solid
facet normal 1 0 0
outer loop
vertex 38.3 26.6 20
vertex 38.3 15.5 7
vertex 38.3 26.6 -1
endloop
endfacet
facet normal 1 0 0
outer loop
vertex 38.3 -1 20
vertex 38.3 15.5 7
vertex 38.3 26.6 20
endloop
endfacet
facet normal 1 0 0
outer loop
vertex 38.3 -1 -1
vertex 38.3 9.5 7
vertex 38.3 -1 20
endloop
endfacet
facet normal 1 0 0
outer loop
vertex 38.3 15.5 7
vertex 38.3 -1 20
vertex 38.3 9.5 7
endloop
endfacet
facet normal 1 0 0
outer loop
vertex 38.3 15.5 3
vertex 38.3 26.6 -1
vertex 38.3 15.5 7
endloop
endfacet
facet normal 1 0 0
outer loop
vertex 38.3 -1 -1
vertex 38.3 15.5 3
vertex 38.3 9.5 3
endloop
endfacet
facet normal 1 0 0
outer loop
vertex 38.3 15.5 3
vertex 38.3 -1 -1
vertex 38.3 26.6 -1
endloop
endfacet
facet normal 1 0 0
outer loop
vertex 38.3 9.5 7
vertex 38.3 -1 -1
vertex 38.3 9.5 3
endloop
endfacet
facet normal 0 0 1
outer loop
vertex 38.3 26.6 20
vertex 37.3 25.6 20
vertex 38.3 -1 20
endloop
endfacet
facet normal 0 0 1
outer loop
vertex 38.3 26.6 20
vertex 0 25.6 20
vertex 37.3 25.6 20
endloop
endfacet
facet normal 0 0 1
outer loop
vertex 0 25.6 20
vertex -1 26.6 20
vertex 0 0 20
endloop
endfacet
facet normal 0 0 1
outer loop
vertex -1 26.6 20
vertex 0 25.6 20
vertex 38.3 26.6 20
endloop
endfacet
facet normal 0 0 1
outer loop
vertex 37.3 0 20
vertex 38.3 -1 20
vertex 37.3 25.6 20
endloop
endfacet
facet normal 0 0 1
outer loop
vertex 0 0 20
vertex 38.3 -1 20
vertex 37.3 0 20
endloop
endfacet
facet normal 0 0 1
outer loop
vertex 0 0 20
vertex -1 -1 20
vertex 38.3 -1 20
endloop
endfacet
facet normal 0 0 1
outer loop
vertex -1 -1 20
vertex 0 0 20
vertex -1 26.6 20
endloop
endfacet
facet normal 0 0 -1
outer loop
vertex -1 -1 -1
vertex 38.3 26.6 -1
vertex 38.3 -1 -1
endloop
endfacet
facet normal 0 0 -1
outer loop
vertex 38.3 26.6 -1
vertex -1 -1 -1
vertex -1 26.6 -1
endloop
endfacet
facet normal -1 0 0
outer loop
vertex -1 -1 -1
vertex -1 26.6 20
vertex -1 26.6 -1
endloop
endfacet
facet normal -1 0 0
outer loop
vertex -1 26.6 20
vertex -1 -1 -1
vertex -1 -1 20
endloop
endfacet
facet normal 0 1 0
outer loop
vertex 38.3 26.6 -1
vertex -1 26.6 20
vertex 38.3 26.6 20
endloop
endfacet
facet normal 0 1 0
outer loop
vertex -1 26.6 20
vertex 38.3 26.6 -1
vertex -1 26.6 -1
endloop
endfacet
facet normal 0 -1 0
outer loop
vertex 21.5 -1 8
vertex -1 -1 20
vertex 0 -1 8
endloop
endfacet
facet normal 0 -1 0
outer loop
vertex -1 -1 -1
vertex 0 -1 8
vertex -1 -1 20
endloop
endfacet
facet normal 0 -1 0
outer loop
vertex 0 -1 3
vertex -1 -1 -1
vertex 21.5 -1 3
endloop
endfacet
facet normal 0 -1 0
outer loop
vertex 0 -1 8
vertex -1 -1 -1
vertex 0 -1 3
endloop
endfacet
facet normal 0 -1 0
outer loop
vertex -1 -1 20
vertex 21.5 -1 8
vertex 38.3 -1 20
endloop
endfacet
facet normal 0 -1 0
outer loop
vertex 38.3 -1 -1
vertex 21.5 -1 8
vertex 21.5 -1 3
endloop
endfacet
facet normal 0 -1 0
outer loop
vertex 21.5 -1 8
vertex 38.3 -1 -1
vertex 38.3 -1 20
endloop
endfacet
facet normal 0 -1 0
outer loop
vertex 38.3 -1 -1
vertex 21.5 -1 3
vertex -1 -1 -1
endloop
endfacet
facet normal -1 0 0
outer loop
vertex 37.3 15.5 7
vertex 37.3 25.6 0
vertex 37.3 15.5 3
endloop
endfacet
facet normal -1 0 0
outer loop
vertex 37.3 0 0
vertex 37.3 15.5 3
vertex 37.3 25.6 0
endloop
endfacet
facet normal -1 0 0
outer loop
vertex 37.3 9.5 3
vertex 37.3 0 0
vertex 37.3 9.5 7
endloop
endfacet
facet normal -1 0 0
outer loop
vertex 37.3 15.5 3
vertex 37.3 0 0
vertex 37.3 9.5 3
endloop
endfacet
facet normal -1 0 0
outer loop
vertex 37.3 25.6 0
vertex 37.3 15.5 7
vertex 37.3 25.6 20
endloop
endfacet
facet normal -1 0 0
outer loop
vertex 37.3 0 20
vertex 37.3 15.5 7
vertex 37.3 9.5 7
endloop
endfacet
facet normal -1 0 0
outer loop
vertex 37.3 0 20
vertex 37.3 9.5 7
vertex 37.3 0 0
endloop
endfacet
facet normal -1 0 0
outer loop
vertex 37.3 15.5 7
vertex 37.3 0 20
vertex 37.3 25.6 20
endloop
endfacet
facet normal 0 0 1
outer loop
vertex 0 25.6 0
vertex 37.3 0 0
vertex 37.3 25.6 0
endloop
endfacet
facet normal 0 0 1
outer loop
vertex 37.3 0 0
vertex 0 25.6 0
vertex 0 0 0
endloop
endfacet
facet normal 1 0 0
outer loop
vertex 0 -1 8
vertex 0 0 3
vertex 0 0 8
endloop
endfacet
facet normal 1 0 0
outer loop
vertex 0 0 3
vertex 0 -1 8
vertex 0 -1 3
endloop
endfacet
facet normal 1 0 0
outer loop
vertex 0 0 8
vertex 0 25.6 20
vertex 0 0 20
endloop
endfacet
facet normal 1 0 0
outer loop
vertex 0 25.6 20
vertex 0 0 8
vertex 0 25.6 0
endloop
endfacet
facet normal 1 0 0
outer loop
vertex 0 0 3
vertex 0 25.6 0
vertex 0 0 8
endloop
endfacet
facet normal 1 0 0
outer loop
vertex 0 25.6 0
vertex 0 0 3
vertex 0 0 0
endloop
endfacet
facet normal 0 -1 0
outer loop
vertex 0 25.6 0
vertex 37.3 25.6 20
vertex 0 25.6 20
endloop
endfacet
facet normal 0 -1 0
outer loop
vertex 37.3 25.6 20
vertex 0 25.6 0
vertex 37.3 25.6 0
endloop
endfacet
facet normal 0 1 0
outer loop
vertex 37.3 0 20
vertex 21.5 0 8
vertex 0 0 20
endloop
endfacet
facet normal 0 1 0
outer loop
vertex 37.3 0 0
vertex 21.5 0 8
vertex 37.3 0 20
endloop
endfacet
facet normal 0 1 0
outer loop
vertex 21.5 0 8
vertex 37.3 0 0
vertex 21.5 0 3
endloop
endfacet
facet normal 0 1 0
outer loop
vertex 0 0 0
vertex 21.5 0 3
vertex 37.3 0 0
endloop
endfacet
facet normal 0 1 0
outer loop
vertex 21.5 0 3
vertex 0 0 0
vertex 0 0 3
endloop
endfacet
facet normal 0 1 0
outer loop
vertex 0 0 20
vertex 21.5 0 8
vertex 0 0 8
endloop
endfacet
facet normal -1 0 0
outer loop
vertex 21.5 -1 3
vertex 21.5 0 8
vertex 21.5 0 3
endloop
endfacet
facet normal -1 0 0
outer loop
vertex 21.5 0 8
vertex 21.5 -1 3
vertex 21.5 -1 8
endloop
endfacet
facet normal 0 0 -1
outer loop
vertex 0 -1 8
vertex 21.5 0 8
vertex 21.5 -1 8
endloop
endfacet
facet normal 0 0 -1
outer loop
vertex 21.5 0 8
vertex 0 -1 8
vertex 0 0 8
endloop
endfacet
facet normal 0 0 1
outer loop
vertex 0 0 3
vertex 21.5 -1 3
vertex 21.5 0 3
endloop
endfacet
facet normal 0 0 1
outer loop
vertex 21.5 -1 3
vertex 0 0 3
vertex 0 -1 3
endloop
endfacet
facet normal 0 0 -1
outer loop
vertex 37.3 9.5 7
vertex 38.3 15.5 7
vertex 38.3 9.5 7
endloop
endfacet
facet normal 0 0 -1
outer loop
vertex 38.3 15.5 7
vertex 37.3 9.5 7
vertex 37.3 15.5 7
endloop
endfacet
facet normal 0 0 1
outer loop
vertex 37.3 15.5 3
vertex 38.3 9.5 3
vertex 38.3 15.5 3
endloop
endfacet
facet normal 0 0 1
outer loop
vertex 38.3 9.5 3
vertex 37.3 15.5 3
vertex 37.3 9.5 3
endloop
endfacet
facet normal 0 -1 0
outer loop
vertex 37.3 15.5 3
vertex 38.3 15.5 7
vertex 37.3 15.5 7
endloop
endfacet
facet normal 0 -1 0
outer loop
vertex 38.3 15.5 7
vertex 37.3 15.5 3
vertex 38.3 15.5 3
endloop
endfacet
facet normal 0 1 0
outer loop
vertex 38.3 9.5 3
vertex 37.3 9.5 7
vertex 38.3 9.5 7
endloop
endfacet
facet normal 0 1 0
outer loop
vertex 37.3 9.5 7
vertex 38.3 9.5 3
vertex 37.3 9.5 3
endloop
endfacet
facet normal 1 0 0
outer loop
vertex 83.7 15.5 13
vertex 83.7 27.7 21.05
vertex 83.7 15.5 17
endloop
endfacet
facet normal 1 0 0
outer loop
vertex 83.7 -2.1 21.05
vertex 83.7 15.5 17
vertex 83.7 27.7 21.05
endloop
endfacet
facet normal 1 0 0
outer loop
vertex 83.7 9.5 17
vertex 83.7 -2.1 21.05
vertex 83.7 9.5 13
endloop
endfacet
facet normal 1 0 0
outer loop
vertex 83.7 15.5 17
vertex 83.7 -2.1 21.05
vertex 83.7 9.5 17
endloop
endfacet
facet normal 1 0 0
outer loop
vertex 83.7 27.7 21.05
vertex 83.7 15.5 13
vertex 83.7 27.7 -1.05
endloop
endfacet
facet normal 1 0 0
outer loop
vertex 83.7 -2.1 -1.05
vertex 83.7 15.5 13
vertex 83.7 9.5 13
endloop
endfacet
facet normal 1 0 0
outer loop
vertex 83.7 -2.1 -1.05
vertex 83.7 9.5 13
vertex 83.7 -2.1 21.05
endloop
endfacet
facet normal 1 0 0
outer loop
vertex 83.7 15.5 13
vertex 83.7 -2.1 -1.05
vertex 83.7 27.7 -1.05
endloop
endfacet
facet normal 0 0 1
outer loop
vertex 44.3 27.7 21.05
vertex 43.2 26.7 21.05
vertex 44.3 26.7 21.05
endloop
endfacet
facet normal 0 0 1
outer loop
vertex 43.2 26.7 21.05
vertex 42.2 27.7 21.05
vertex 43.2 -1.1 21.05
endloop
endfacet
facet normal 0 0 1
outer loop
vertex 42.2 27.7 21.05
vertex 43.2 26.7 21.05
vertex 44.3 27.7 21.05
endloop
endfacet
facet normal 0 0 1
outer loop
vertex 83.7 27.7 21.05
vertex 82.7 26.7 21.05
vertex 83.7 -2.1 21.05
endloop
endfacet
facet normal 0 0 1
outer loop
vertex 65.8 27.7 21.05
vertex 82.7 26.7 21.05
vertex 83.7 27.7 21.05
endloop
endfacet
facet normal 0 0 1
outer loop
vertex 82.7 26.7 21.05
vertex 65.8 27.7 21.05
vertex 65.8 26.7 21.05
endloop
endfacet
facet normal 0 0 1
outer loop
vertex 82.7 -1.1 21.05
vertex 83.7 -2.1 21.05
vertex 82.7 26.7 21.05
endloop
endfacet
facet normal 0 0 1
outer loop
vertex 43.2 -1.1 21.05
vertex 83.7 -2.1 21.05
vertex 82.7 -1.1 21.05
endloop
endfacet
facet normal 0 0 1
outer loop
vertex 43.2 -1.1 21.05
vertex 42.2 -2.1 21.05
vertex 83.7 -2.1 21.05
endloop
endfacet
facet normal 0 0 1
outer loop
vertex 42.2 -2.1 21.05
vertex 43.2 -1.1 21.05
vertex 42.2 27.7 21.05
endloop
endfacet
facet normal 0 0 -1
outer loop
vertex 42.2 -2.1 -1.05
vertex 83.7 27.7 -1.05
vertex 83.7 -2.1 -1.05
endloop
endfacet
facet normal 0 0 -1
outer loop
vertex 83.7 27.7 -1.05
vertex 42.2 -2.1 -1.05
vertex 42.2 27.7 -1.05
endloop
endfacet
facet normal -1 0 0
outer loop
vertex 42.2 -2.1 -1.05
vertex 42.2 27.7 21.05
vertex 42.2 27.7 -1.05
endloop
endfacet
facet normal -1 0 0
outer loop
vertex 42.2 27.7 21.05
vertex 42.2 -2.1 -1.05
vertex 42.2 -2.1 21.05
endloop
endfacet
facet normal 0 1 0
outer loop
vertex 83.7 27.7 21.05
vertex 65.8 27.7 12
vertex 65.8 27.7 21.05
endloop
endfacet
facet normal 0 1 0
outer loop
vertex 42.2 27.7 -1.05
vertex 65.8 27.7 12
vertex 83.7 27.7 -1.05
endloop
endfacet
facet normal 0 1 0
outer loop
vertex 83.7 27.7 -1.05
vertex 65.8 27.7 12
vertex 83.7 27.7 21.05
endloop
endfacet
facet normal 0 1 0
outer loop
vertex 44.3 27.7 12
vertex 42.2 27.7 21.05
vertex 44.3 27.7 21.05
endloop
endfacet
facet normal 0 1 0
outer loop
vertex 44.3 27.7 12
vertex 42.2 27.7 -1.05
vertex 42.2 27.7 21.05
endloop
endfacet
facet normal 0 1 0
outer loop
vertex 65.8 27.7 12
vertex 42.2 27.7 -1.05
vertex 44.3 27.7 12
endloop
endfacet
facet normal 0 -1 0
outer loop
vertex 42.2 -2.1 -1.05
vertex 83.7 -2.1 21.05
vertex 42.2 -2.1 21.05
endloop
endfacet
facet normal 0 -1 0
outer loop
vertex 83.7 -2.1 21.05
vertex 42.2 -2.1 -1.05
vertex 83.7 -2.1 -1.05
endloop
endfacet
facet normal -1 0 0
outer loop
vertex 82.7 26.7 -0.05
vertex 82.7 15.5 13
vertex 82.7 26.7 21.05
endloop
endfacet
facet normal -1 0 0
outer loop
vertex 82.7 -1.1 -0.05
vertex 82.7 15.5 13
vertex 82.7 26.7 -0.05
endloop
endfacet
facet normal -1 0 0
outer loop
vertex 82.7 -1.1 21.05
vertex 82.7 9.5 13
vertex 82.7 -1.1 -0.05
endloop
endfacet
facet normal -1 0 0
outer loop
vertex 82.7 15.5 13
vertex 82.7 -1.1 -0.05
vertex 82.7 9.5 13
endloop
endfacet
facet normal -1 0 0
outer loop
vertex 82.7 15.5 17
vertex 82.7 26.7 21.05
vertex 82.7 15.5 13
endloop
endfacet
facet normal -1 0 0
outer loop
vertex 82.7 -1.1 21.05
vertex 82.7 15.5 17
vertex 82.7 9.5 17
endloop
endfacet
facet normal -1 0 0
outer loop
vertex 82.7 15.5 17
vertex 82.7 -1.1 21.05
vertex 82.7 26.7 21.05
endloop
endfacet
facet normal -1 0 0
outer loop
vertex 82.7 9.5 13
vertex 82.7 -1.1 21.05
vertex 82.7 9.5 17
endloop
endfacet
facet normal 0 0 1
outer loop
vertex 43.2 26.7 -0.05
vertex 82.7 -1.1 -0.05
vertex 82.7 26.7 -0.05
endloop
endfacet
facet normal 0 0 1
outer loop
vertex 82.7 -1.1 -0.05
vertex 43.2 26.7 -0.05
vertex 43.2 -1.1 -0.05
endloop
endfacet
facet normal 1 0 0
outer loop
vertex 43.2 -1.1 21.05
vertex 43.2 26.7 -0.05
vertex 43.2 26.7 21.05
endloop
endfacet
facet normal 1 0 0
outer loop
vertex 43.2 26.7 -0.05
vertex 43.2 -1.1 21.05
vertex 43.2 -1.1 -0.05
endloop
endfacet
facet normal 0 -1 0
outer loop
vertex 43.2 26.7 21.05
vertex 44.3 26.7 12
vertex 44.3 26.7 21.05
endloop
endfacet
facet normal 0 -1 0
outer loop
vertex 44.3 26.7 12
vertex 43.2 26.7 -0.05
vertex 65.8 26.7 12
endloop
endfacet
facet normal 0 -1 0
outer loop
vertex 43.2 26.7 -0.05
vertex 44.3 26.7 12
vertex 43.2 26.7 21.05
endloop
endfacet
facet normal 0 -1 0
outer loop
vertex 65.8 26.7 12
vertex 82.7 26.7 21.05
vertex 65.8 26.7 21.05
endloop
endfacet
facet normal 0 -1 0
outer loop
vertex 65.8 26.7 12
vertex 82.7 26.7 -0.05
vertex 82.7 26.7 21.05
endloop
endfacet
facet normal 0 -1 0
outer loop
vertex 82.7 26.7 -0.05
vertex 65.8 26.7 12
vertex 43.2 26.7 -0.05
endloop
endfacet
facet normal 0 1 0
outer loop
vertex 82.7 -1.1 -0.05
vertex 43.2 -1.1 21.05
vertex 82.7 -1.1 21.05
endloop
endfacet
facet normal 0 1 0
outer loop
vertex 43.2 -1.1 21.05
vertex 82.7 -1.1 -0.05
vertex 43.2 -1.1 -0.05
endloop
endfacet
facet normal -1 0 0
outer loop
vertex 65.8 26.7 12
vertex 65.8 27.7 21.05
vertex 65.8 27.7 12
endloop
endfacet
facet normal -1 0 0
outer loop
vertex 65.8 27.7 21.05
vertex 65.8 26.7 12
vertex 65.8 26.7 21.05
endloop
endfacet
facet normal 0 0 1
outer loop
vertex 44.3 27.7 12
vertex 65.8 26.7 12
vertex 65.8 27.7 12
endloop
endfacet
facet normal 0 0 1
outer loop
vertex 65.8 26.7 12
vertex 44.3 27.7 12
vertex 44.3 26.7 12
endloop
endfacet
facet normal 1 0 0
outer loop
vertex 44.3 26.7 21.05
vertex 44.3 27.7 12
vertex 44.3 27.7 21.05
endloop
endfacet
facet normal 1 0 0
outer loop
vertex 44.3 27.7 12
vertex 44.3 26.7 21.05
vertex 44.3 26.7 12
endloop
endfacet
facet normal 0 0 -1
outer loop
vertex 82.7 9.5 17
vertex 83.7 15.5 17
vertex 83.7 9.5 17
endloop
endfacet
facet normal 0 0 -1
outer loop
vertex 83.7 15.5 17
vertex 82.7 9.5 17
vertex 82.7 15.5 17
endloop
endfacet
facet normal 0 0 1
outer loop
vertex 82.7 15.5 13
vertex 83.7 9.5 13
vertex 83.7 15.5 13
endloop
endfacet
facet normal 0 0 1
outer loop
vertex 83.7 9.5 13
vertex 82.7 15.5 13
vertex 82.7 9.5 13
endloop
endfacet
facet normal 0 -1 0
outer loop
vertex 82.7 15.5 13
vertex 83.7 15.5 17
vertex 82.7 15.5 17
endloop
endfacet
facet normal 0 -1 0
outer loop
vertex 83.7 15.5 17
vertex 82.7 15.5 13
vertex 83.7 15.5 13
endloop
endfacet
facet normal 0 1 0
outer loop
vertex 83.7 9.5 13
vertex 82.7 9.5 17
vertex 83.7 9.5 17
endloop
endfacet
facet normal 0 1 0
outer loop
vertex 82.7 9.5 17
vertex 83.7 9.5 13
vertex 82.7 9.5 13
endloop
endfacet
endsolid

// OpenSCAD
boundary=[37,25.4,20]+[.3,.2,0];
space=[.2,.2,.1];
conn = [0,3,21.5,5];
reset = [9.5,3,6,4];
wall = 1;

difference() {
	translate([-wall,-wall,-wall]) cube(boundary+[2*wall,2*wall,wall]);
	cube(boundary+[0,0,1]);
	translate([conn[0],-wall-1,conn[1]]) cube([conn[2],1+wall+1,conn[3]]);
	translate([boundary[0]-1,reset[0],reset[1]]) cube([1+wall+1,reset[2],reset[3]]);
}

translate([boundary[0]+2*wall+5,0,0]) difference() {
	translate([-2*wall,-2*wall,-wall]-space/2) cube(boundary + [4*wall,4*wall,2*wall] + space);
	translate([-wall,-wall,0]-space/2) cube(boundary + [2*wall,2*wall,wall+1] + space);
	translate([0,boundary[1],boundary[2]-conn[1]-conn[3]]) cube([conn[2],1+wall+1,conn[1]+conn[3]+wall+1]);
	translate([boundary[0],reset[0],boundary[2]-reset[1]-reset[3]]) cube([1+wall+1,reset[2],reset[3]]);
}
